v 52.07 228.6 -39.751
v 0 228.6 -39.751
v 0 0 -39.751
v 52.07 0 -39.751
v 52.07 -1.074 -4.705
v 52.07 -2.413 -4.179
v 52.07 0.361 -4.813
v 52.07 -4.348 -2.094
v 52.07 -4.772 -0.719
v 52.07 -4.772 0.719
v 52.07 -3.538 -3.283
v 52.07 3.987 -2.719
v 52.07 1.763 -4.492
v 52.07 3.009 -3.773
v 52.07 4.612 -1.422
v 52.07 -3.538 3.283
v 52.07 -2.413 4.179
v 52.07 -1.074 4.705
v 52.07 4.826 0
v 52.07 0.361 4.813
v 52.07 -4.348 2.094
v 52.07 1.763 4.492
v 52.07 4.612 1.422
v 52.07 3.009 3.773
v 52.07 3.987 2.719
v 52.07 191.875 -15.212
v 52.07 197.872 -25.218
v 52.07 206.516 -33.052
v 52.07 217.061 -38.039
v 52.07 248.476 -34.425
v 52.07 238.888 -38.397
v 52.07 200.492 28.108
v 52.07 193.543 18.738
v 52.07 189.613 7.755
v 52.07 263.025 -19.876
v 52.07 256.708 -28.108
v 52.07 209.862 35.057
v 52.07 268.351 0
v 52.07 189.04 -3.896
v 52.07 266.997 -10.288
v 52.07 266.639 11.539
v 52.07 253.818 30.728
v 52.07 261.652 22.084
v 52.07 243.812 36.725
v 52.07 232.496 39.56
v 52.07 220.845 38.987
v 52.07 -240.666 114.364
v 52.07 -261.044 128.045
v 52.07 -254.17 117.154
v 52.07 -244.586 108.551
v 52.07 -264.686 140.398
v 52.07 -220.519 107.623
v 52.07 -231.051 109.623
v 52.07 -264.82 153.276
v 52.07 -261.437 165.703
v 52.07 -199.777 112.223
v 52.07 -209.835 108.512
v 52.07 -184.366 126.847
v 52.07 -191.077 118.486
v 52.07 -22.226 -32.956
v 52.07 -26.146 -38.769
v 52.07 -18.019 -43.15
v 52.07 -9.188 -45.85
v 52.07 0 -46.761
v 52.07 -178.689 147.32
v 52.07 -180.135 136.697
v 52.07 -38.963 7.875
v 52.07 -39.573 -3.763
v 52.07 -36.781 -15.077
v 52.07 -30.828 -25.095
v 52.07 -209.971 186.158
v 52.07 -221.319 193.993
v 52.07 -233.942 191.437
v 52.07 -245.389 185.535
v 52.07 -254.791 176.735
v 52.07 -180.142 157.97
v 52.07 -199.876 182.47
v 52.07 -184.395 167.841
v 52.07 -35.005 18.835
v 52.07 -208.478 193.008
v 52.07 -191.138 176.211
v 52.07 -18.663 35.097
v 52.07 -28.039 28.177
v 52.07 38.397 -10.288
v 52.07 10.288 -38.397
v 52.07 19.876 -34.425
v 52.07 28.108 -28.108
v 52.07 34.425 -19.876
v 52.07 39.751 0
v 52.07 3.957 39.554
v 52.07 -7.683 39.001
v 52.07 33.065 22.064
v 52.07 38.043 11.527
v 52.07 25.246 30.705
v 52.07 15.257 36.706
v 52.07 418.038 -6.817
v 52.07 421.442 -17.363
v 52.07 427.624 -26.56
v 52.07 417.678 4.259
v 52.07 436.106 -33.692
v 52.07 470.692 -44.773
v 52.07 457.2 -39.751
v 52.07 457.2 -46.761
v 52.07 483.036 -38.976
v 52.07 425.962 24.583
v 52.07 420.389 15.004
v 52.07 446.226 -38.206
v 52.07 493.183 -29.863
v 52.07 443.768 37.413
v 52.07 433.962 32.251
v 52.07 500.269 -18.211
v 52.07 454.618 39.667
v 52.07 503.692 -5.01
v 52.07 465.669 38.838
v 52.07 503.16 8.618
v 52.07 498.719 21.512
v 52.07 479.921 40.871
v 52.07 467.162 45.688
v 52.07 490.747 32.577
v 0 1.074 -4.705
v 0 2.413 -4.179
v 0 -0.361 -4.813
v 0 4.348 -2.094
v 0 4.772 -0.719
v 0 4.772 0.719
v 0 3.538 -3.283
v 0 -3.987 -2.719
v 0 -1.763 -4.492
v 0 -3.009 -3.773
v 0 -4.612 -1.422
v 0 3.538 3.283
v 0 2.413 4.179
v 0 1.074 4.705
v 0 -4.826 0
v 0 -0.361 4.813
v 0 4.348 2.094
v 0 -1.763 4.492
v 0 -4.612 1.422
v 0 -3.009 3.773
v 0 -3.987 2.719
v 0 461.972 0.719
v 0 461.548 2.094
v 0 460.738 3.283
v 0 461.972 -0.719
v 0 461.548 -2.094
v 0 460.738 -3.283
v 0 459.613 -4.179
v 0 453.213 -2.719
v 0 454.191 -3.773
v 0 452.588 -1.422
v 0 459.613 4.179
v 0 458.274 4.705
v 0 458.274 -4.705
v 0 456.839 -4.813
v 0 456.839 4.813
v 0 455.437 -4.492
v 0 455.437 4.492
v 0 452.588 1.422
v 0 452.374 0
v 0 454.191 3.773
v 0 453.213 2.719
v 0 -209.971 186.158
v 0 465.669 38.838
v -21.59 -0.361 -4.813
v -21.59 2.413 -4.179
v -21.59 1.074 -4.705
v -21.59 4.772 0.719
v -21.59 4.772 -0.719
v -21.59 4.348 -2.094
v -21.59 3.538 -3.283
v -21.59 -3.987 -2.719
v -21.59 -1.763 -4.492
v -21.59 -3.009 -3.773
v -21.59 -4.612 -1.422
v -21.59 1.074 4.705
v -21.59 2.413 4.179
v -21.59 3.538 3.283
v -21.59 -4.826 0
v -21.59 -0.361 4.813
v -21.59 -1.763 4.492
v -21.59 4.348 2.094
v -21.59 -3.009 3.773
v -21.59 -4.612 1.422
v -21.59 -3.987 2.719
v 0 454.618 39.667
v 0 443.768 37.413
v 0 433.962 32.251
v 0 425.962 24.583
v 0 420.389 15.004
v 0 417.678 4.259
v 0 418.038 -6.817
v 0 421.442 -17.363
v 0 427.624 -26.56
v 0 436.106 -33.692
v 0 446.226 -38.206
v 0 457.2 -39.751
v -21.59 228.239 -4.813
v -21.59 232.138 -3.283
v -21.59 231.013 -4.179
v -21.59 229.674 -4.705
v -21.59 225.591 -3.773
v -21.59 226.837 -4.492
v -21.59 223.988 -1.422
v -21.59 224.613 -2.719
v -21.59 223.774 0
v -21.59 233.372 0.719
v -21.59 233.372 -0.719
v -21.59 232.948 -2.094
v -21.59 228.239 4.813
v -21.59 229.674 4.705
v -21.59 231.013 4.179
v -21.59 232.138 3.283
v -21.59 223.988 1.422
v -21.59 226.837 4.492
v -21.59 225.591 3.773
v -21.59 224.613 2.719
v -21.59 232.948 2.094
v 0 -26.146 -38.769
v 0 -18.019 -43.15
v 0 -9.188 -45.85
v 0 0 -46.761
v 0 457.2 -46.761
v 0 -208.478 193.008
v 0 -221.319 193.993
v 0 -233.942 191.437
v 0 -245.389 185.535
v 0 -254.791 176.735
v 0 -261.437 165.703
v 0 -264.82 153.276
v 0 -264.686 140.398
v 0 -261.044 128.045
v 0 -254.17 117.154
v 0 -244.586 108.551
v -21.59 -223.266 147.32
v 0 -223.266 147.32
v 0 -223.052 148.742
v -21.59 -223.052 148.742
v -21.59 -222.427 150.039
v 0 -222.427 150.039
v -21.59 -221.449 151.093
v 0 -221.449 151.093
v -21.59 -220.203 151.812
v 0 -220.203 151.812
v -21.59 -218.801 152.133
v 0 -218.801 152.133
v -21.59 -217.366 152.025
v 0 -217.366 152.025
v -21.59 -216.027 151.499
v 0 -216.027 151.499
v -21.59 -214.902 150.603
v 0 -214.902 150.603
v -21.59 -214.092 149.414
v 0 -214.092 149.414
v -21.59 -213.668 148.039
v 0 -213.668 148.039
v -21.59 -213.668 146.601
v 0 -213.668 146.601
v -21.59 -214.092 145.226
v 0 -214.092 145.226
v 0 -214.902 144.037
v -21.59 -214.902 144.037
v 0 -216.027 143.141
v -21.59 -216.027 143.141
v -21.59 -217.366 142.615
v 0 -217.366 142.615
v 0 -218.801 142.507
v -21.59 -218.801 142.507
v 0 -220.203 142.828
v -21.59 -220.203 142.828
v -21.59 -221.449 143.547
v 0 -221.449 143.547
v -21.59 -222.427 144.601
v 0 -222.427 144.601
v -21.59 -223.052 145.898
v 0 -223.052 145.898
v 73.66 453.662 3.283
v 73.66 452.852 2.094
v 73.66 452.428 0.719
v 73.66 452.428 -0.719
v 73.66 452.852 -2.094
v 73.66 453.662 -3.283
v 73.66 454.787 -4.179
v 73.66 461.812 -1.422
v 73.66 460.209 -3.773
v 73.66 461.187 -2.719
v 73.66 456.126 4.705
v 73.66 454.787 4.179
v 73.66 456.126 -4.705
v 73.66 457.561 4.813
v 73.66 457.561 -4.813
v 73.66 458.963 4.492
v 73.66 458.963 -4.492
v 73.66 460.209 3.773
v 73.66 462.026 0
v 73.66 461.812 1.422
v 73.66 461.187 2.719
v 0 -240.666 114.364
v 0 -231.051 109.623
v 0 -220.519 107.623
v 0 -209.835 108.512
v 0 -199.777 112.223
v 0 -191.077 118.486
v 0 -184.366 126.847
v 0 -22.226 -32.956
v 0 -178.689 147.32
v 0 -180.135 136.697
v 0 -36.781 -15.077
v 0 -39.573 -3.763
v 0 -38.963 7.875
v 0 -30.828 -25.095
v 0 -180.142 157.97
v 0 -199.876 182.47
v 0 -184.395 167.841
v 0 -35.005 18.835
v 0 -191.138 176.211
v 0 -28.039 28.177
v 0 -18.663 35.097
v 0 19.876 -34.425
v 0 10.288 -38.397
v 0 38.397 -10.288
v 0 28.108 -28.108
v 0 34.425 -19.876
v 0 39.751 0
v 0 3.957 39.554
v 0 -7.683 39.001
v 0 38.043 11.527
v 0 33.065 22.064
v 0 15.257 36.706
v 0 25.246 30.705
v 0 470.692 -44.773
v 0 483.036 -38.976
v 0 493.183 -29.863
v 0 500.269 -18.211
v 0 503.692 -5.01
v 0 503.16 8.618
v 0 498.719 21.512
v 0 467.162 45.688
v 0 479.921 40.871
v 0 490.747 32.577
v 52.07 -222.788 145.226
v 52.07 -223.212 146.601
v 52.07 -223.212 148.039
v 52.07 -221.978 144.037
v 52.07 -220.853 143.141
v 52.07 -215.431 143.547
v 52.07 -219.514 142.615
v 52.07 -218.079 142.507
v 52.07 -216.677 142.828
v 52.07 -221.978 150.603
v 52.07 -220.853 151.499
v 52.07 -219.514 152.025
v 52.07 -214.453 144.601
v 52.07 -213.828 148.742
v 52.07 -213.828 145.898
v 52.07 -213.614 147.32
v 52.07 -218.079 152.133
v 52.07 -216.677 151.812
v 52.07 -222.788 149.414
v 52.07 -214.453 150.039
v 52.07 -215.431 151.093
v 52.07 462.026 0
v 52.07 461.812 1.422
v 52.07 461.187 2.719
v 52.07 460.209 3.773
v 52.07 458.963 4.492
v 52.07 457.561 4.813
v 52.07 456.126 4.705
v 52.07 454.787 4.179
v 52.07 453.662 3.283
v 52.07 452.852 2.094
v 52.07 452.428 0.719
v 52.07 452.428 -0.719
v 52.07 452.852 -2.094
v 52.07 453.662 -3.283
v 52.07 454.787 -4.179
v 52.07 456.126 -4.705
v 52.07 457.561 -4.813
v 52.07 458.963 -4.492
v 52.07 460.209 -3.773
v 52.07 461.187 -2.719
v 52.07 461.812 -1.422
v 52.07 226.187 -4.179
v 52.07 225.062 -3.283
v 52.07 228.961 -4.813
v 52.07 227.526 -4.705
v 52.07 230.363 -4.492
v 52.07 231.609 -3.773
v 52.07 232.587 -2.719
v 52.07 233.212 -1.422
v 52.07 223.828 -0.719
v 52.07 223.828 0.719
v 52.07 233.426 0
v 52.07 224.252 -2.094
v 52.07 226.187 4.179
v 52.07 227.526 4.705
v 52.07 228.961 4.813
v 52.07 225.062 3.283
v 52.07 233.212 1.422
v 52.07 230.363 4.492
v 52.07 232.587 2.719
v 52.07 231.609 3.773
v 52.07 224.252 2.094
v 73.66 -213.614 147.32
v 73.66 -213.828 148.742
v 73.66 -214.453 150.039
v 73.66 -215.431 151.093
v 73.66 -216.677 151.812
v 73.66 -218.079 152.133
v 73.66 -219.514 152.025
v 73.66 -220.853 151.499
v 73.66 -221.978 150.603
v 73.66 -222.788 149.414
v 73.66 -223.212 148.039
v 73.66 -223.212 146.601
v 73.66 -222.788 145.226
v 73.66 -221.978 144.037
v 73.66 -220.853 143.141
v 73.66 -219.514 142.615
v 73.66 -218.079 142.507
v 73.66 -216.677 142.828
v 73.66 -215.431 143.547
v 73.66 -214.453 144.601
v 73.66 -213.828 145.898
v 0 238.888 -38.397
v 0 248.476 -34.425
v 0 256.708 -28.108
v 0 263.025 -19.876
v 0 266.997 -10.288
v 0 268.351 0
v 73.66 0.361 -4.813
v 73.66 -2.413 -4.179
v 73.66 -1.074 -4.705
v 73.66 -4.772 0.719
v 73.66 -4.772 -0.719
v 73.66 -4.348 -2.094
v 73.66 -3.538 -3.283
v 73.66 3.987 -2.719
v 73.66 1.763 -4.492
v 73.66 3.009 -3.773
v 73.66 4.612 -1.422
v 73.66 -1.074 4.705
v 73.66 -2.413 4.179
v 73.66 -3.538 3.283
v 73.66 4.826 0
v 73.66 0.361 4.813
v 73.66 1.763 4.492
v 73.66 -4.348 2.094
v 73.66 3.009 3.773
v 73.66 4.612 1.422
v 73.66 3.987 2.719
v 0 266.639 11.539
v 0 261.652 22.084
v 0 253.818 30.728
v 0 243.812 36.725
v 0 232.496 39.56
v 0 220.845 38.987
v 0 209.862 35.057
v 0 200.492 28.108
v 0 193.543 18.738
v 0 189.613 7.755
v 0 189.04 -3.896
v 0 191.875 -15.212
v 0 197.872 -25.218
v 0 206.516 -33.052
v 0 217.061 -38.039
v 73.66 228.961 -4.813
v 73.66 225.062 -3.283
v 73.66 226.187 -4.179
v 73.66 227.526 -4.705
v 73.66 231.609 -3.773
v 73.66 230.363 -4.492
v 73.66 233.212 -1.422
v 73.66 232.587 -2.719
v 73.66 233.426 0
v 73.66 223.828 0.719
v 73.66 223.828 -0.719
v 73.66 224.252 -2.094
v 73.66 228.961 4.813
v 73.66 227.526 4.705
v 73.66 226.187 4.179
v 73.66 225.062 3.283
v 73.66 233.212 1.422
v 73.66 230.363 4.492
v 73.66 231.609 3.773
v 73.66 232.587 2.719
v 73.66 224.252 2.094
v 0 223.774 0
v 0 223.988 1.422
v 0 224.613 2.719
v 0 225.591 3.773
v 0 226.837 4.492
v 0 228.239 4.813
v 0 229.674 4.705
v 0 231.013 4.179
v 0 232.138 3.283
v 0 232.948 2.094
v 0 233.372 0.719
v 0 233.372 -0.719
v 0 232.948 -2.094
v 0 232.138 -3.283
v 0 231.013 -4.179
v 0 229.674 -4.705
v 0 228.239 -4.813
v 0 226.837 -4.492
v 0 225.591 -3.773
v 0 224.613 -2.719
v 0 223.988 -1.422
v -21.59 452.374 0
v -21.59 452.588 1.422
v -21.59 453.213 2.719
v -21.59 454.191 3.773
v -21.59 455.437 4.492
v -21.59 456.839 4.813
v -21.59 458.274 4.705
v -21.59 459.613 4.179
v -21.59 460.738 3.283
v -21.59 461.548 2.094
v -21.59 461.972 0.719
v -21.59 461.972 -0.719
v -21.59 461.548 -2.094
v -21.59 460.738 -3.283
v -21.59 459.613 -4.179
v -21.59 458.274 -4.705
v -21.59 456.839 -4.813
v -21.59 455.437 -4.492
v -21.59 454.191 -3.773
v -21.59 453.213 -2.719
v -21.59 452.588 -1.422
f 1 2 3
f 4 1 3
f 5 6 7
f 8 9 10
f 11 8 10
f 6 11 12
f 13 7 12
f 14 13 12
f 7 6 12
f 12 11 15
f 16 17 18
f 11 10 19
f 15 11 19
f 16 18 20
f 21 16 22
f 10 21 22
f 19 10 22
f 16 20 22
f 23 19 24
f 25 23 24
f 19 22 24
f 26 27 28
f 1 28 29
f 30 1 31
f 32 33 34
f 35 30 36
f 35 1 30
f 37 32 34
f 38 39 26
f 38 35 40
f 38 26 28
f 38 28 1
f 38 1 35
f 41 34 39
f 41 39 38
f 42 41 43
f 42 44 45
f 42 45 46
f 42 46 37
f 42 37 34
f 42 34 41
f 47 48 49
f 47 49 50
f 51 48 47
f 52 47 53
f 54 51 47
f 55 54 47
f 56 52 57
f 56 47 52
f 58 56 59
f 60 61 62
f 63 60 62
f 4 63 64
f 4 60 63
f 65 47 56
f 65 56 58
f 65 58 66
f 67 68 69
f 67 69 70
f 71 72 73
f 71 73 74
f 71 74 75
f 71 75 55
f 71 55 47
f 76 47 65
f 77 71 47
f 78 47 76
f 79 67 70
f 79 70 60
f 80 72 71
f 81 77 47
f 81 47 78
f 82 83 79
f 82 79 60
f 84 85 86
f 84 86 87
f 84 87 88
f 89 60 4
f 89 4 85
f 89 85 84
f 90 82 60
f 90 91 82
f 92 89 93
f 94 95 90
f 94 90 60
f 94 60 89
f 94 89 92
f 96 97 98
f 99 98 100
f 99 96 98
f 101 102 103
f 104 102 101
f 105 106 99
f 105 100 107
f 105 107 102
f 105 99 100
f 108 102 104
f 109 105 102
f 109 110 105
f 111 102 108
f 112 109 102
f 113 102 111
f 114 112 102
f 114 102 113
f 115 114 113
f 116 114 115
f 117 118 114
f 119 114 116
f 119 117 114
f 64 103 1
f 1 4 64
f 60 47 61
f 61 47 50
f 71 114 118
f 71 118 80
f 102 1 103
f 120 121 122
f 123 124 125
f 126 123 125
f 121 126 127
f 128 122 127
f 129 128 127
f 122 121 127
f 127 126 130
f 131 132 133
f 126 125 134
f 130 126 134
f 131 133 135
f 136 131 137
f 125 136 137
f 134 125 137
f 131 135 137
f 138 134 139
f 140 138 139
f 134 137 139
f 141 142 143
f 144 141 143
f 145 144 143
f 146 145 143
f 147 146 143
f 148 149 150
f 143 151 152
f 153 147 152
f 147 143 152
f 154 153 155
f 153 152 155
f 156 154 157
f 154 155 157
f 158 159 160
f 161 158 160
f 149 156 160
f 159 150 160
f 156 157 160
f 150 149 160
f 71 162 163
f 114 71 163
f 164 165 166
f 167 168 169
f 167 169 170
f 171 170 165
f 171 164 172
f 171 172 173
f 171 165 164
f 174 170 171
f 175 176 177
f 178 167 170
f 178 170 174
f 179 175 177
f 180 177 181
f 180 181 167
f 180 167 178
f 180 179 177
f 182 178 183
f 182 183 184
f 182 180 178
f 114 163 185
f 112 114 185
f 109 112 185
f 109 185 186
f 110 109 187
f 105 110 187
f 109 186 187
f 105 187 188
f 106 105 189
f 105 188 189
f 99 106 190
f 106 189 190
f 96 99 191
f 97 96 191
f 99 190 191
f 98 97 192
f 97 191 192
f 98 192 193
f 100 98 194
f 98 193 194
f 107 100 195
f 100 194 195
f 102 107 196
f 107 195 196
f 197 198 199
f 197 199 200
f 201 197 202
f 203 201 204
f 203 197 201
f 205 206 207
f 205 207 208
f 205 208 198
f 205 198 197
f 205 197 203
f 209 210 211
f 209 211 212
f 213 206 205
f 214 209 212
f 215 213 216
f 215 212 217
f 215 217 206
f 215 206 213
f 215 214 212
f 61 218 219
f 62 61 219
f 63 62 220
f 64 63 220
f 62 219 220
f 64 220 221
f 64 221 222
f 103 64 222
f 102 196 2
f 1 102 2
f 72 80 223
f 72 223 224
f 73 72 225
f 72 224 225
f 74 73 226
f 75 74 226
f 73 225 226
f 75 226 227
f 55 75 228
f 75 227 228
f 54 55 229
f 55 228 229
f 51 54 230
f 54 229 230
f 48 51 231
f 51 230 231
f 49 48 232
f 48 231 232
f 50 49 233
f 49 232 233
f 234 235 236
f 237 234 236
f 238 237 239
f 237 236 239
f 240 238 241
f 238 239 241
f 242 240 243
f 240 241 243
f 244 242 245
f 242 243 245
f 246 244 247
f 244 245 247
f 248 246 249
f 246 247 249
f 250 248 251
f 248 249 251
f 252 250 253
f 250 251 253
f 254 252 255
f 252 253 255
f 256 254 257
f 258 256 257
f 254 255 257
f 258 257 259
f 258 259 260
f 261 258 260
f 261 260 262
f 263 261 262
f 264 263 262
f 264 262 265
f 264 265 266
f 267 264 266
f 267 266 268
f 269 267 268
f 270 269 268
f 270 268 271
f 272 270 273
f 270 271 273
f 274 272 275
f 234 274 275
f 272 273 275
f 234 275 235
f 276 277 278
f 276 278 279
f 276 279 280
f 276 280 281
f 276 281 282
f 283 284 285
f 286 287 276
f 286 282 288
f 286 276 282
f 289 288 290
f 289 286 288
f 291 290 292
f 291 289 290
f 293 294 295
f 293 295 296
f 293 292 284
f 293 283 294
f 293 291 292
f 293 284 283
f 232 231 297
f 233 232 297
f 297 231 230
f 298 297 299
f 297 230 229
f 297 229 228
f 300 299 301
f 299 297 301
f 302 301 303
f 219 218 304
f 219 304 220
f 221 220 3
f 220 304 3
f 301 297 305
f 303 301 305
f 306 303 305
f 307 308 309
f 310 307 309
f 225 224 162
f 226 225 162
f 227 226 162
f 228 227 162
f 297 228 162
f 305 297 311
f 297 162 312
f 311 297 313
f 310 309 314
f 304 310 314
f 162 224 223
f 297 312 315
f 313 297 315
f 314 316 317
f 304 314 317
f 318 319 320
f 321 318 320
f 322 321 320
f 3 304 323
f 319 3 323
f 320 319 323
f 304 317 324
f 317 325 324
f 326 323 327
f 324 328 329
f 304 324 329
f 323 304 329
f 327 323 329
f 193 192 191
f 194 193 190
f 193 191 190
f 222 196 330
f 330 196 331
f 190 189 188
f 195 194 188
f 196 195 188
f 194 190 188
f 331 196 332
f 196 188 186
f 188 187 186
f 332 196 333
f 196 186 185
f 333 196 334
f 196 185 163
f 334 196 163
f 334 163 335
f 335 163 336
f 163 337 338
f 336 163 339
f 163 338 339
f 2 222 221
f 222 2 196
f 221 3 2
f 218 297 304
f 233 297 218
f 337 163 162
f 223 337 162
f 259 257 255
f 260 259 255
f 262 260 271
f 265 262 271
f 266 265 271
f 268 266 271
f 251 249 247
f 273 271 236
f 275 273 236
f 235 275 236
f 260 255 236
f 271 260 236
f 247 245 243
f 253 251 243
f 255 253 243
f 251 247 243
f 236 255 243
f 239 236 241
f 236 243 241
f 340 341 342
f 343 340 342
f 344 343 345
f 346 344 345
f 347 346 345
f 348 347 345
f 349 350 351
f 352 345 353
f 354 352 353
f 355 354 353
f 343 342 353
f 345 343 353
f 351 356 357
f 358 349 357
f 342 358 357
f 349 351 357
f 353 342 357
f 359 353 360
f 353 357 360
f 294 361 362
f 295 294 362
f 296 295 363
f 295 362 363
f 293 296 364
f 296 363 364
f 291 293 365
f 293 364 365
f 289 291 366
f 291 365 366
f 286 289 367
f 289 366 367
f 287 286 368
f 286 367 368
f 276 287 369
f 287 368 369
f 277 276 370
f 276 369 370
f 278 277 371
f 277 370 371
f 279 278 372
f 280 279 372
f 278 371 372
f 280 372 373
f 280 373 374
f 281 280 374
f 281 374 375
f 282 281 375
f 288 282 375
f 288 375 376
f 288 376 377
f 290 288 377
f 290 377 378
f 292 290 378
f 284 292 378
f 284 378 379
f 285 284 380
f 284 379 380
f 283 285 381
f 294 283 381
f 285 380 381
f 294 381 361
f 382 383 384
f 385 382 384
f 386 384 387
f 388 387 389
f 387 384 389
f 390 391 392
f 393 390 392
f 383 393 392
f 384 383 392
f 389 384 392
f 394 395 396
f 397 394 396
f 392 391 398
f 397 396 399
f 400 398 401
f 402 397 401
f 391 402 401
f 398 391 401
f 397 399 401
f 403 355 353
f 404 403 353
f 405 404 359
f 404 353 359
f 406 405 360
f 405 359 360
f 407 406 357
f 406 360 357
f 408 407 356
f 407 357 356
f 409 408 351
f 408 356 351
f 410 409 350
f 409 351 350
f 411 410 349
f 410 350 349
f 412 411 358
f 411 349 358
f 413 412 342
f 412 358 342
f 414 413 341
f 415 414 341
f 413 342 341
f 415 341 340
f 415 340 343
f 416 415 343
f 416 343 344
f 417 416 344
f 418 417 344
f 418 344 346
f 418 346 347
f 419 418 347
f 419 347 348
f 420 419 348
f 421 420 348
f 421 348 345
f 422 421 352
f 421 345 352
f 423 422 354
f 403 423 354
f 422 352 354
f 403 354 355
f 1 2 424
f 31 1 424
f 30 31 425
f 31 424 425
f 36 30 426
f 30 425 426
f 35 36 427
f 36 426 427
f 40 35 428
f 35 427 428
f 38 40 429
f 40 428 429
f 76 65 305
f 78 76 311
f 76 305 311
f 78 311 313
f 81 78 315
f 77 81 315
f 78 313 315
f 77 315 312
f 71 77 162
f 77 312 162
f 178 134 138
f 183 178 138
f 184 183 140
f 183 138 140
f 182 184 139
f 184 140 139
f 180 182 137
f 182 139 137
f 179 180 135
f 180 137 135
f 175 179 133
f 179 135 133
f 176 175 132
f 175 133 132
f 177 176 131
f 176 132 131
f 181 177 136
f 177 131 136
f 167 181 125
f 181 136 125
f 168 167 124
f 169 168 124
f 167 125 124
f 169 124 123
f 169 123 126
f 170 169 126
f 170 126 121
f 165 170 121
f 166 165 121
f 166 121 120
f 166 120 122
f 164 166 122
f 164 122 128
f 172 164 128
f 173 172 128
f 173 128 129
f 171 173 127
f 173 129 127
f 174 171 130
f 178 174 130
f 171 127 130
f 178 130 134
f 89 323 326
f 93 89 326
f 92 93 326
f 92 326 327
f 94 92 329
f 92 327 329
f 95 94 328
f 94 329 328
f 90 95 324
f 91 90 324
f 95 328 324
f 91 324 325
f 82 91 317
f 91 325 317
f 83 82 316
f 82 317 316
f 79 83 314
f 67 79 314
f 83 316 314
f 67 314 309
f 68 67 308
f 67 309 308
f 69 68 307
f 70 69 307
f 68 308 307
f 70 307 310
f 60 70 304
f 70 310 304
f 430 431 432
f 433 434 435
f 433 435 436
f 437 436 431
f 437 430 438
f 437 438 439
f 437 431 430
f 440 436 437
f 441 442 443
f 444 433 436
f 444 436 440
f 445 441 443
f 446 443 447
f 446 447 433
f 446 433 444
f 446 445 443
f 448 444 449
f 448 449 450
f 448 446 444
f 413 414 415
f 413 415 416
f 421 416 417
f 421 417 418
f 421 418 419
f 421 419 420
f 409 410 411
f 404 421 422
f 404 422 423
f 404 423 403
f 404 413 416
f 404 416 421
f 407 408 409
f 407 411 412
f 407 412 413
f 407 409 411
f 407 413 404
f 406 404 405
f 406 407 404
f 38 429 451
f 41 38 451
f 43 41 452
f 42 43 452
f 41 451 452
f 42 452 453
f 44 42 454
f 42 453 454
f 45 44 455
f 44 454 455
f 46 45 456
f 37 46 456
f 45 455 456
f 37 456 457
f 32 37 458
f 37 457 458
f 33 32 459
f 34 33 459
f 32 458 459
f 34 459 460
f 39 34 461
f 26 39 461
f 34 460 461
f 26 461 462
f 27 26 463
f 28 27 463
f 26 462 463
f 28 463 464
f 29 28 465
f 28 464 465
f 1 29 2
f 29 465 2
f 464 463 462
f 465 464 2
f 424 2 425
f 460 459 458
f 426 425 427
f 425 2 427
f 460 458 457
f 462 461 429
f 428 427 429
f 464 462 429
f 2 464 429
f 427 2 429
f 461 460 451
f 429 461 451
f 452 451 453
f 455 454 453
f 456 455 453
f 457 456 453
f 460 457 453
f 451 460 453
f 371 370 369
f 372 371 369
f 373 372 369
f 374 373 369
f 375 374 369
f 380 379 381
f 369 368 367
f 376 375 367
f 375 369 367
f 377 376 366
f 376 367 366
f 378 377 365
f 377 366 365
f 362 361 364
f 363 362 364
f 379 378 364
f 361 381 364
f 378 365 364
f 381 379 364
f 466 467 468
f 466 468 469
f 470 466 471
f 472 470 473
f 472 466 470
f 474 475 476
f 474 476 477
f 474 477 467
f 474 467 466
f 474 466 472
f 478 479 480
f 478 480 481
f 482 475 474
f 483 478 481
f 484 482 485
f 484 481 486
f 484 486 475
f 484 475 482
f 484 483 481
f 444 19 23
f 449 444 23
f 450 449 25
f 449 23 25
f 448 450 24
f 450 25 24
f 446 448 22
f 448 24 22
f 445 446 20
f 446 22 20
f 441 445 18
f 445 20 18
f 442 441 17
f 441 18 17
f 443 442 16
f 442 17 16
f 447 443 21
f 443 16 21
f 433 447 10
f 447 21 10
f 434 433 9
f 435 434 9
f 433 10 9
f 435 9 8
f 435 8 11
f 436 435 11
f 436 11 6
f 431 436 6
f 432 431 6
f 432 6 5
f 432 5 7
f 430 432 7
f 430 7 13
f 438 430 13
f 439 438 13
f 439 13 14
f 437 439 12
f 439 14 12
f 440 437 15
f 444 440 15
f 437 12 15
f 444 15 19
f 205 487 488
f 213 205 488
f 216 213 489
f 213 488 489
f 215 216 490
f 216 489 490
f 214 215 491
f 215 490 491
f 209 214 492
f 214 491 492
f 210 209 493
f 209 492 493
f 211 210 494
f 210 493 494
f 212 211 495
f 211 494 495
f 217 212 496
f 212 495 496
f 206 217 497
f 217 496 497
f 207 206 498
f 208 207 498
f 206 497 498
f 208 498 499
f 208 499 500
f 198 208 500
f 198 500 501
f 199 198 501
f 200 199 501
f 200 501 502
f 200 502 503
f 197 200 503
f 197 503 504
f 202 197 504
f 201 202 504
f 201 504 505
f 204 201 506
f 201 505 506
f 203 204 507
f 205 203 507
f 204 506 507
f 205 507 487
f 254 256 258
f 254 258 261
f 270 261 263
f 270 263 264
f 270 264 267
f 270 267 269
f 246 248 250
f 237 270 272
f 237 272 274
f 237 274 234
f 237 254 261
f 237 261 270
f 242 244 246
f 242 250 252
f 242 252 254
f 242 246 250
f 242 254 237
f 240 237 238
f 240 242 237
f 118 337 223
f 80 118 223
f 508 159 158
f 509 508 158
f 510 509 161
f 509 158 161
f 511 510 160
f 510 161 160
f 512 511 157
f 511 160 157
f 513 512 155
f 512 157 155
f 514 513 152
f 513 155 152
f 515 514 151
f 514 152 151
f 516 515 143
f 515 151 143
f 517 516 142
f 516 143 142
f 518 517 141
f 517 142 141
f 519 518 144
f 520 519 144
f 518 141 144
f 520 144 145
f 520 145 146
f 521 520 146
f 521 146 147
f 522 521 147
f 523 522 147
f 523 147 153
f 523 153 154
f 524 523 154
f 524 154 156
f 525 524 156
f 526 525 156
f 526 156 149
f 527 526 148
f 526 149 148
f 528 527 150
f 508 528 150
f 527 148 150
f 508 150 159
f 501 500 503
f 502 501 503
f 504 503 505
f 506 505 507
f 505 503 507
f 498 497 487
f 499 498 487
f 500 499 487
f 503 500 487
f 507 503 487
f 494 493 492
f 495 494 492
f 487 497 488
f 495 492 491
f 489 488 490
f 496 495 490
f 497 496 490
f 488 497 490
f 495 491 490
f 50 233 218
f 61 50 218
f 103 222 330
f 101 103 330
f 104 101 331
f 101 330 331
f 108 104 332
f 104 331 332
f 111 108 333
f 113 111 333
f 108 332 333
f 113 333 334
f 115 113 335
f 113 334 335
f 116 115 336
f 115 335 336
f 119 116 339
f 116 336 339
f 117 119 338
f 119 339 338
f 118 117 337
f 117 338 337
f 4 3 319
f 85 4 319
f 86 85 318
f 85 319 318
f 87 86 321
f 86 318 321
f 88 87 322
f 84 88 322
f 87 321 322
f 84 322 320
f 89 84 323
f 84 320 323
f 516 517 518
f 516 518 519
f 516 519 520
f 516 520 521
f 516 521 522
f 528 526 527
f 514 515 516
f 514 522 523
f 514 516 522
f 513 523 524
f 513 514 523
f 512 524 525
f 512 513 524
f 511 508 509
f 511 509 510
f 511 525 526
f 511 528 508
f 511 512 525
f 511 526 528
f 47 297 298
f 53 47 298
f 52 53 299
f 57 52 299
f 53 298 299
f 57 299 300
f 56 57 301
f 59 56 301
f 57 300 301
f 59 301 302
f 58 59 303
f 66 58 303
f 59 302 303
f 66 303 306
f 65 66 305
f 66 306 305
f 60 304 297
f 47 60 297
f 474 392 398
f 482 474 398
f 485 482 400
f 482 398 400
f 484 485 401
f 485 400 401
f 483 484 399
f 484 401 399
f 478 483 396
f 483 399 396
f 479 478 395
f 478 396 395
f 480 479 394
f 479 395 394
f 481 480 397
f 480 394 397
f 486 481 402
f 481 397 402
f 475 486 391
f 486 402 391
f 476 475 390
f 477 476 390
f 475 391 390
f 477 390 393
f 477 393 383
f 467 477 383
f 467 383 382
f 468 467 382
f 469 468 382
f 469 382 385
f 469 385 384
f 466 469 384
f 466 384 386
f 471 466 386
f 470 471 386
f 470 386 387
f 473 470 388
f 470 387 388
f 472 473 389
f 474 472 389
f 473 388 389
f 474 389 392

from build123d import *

# Parameters (mm, degrees)
F1_DEPTH = 52.07
F2_R     = 4.826
F3_DEPTH = 21.59
F4_R     = 4.826
F5_DEPTH = 21.59


with BuildPart() as f1:
    # F0 (on Right) → F1 (new body)
    with BuildSketch(Plane.YZ):
        with BuildLine():
            ThreePointArc((-26.146247, -38.768573), (-13.670328, -44.718572), (0, -46.7614))
            Line((0, -46.7614), (457.2, -46.7614))
            ThreePointArc((457.2, -46.7614), (503.692257, -5.009849), (467.162029, 45.687925))
            Line((467.162029, 45.687925), (-208.477971, 193.007925))
            ThreePointArc((-208.477971, 193.007925), (-261.436596, 165.702635), (-244.586247, 108.551427))
            Line((-244.586247, 108.551427), (-26.146247, -38.768573))
        make_face()
        with BuildLine():
            ThreePointArc((0, -39.751), (-11.620893, -38.014429), (-22.22644, -32.956446))
            Line((-22.22644, -32.956446), (-240.66644, 114.363554))
            ThreePointArc((-240.66644, 114.363554), (-254.99061, 162.946737), (-209.971464, 186.158459))
            Line((-209.971464, 186.158459), (465.668536, 38.838459))
            ThreePointArc((465.668536, 38.838459), (488.157832, 24.935008), (496.951, 0))
            ThreePointArc((496.951, 0), (485.308202, -28.108202), (457.2, -39.751))
            Line((457.2, -39.751), (228.6, -39.751))
            Line((228.6, -39.751), (0, -39.751))
        make_face(mode=Mode.SUBTRACT)
        with BuildLine():
            ThreePointArc((268.351, 0), (200.491798, 28.108202), (228.6, -39.751))
            ThreePointArc((228.6, -39.751), (256.708202, -28.108202), (268.351, 0))
        make_face()
        with BuildLine():
            ThreePointArc((465.668536, 38.838459), (417.677794, 4.25878), (457.2, -39.751))
            ThreePointArc((457.2, -39.751), (485.308202, -28.108202), (496.951, 0))
            ThreePointArc((496.951, 0), (488.157832, 24.935008), (465.668536, 38.838459))
        make_face()
        with BuildLine():
            ThreePointArc((0, -39.751), (28.108202, -28.108202), (39.751, 0))
            ThreePointArc((39.751, 0), (-18.663049, 35.097473), (-22.22644, -32.956446))
            ThreePointArc((-22.22644, -32.956446), (-11.620893, -38.014429), (0, -39.751))
        make_face()
        with BuildLine():
            ThreePointArc((-209.971464, 186.158459), (-254.99061, 162.946737), (-240.66644, 114.363554))
            ThreePointArc((-240.66644, 114.363554), (-199.776951, 112.222527), (-178.689, 147.32))
            ThreePointArc((-178.689, 147.32), (-187.482168, 172.255008), (-209.971464, 186.158459))
        make_face()
    extrude(amount=F1_DEPTH)


with BuildPart() as f3:
    # F2 (on face) → F3 (new body)
    with BuildSketch(Plane.YZ.offset(52.07)):
        with Locations((-218.44, 147.32)):
            Circle(F2_R)
        Circle(F2_R)
        with Locations((228.6, 0)):
            Circle(F2_R)
        with Locations((457.2, 0)):
            Circle(F2_R)
    extrude(amount=F3_DEPTH)


with BuildPart() as f5:
    # F4 (on face) → F5 (new body)
    with BuildSketch(Plane(origin=(0, 0, 0), x_dir=(0, -1, 0), z_dir=(-1, 0, 0))):
        with Locations((-457.2, 0)):
            Circle(F4_R)
        with Locations((-228.6, 0)):
            Circle(F4_R)
        Circle(F4_R)
        with Locations((218.44, 147.32)):
            Circle(F4_R)
    extrude(amount=F5_DEPTH)


solid = Compound([f1.part, f3.part, f5.part])
